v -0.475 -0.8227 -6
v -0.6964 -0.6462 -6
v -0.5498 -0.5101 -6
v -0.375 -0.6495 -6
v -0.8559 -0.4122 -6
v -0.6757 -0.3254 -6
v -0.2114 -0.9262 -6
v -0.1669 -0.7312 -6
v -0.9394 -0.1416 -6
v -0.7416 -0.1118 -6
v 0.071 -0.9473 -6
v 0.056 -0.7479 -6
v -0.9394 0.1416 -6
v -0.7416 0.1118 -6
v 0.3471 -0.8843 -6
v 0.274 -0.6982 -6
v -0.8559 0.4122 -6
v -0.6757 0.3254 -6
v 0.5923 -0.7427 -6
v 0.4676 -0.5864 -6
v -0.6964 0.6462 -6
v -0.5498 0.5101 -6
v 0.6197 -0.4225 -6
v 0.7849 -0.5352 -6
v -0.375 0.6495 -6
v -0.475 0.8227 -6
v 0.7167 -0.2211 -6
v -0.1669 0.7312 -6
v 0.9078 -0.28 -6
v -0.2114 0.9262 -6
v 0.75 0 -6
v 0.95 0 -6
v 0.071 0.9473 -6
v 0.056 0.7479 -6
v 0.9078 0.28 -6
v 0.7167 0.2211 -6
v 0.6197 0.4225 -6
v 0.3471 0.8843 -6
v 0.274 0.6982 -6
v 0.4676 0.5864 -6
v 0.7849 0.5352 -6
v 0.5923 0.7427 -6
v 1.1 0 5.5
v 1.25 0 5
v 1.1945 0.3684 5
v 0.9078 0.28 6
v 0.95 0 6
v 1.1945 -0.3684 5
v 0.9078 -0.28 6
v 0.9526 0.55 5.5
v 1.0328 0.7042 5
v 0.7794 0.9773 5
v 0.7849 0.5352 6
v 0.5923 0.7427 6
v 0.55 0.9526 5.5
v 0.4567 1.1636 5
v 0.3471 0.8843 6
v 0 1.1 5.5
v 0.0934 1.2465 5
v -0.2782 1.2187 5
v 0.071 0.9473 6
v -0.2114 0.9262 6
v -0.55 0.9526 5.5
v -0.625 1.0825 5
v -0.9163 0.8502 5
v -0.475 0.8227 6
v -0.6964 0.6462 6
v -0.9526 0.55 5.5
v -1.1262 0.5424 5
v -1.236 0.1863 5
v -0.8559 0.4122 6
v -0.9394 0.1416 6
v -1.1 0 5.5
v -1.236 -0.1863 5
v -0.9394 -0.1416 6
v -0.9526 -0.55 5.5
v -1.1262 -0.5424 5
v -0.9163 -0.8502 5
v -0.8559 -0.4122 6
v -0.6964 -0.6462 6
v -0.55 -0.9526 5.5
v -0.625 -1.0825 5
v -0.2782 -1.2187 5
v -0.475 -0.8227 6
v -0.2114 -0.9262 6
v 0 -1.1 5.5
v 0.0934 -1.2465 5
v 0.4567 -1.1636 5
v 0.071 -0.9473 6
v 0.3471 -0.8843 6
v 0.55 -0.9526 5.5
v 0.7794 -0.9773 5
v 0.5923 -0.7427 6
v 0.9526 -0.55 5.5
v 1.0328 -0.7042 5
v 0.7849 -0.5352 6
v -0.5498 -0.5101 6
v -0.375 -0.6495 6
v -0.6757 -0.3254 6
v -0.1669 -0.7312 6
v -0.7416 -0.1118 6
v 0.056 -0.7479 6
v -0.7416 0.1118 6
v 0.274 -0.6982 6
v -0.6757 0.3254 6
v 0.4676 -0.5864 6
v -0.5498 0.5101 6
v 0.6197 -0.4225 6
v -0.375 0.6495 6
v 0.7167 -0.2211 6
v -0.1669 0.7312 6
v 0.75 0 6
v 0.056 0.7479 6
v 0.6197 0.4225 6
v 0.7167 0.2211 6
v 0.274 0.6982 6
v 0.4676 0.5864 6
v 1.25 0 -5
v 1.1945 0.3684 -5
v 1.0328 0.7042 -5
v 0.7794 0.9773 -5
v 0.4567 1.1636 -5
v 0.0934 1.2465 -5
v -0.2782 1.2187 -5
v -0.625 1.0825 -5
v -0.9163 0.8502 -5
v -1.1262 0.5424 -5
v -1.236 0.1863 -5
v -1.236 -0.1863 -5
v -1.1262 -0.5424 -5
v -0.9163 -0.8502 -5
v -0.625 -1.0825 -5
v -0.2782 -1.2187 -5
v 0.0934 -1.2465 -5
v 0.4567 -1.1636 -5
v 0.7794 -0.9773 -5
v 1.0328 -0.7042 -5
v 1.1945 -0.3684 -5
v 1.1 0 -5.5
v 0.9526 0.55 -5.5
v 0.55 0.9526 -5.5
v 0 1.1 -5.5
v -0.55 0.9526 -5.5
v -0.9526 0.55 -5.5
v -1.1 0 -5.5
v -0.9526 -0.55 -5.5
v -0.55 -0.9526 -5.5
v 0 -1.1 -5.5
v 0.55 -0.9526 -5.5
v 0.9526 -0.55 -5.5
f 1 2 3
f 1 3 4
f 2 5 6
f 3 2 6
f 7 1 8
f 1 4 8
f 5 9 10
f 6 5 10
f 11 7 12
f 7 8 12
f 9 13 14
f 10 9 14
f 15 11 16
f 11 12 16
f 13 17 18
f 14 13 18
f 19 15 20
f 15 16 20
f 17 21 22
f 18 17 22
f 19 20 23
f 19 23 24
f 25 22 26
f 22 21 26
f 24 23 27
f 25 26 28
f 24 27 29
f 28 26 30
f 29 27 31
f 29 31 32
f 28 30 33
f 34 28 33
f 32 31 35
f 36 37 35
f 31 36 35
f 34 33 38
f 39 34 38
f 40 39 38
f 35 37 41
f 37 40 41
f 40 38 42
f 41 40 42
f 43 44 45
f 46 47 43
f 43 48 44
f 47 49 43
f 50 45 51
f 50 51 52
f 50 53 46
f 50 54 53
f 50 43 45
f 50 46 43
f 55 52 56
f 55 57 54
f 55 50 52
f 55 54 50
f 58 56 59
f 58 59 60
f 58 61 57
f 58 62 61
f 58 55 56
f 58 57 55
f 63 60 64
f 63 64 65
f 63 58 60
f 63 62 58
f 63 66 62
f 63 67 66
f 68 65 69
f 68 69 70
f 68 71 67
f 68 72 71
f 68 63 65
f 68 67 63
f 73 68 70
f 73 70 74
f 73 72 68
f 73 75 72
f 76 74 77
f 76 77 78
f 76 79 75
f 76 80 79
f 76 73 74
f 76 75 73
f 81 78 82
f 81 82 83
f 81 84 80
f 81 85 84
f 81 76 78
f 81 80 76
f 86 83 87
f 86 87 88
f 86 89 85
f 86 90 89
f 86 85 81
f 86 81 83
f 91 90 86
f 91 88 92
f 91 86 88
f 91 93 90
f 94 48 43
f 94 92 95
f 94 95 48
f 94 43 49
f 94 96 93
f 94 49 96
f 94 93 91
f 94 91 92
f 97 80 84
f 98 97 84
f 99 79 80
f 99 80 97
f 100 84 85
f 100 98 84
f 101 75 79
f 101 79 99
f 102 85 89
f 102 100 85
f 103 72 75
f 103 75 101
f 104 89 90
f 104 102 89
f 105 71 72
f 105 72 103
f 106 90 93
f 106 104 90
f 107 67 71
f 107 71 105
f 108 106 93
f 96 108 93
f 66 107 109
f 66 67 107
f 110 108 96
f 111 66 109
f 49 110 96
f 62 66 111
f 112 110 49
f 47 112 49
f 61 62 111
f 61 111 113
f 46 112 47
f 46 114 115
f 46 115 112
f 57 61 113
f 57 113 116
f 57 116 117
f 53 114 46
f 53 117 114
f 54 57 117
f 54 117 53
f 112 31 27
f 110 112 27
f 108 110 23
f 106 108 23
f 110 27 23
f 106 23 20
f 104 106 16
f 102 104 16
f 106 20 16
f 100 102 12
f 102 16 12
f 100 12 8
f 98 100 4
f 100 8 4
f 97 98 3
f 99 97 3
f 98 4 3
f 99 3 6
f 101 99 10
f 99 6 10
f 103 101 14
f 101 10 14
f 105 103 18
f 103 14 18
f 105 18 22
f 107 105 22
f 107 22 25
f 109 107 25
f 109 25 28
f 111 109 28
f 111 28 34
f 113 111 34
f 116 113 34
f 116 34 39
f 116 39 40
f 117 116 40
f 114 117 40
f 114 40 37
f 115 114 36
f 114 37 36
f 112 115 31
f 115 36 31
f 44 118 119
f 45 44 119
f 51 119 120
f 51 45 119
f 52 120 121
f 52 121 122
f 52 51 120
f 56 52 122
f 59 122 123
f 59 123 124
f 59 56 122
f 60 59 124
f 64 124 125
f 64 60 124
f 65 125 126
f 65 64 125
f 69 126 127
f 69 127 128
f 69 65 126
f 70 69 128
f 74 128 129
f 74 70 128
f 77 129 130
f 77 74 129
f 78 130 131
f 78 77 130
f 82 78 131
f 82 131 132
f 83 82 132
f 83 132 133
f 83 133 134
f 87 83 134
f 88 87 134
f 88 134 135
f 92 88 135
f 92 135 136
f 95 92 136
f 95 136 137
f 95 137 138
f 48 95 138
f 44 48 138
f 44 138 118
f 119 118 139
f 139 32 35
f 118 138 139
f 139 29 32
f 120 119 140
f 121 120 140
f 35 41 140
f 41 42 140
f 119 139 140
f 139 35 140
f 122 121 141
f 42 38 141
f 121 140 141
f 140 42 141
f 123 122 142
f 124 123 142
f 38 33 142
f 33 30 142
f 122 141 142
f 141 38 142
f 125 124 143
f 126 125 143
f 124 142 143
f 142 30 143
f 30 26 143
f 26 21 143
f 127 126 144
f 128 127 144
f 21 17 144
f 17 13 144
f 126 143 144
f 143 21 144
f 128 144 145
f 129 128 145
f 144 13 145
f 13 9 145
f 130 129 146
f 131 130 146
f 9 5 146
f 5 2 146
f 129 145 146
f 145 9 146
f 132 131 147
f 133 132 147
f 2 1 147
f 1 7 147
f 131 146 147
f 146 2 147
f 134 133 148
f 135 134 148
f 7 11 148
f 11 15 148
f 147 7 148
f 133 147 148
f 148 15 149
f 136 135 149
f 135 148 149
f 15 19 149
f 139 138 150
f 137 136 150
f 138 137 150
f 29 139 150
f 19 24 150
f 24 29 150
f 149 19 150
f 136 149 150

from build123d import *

# Parameters (mm, degrees)
F0_R     = 1.25
F1_DEPTH = 6
F2_R     = 0.75
F3_DEPTH = 12
F4_SIZE2 = 0.3
F4_SIZE  = 1


with BuildPart() as f1:
    # F0 (on Top) → F1 (new body, symmetric)
    with BuildSketch(Plane.XY):
        Circle(F0_R)
    extrude(amount=F1_DEPTH, both=True)

    # F2 (on face) → F3 (cut, through all)
    with BuildSketch(Plane(origin=(0, 0, -6), x_dir=(1, 0, 0), z_dir=(0, 0, -1))):
        Circle(F2_R)
    extrude(amount=-F3_DEPTH, mode=Mode.SUBTRACT)

    # F4
    f4_edges = [f1.edges().sort_by_distance(p)[0] for p in [
        (-1.25, 0, -6),
        (-1.25, 0, 6),
    ]]
    chamfer(f4_edges, length=F4_SIZE, length2=F4_SIZE2)


solid = f1.part
